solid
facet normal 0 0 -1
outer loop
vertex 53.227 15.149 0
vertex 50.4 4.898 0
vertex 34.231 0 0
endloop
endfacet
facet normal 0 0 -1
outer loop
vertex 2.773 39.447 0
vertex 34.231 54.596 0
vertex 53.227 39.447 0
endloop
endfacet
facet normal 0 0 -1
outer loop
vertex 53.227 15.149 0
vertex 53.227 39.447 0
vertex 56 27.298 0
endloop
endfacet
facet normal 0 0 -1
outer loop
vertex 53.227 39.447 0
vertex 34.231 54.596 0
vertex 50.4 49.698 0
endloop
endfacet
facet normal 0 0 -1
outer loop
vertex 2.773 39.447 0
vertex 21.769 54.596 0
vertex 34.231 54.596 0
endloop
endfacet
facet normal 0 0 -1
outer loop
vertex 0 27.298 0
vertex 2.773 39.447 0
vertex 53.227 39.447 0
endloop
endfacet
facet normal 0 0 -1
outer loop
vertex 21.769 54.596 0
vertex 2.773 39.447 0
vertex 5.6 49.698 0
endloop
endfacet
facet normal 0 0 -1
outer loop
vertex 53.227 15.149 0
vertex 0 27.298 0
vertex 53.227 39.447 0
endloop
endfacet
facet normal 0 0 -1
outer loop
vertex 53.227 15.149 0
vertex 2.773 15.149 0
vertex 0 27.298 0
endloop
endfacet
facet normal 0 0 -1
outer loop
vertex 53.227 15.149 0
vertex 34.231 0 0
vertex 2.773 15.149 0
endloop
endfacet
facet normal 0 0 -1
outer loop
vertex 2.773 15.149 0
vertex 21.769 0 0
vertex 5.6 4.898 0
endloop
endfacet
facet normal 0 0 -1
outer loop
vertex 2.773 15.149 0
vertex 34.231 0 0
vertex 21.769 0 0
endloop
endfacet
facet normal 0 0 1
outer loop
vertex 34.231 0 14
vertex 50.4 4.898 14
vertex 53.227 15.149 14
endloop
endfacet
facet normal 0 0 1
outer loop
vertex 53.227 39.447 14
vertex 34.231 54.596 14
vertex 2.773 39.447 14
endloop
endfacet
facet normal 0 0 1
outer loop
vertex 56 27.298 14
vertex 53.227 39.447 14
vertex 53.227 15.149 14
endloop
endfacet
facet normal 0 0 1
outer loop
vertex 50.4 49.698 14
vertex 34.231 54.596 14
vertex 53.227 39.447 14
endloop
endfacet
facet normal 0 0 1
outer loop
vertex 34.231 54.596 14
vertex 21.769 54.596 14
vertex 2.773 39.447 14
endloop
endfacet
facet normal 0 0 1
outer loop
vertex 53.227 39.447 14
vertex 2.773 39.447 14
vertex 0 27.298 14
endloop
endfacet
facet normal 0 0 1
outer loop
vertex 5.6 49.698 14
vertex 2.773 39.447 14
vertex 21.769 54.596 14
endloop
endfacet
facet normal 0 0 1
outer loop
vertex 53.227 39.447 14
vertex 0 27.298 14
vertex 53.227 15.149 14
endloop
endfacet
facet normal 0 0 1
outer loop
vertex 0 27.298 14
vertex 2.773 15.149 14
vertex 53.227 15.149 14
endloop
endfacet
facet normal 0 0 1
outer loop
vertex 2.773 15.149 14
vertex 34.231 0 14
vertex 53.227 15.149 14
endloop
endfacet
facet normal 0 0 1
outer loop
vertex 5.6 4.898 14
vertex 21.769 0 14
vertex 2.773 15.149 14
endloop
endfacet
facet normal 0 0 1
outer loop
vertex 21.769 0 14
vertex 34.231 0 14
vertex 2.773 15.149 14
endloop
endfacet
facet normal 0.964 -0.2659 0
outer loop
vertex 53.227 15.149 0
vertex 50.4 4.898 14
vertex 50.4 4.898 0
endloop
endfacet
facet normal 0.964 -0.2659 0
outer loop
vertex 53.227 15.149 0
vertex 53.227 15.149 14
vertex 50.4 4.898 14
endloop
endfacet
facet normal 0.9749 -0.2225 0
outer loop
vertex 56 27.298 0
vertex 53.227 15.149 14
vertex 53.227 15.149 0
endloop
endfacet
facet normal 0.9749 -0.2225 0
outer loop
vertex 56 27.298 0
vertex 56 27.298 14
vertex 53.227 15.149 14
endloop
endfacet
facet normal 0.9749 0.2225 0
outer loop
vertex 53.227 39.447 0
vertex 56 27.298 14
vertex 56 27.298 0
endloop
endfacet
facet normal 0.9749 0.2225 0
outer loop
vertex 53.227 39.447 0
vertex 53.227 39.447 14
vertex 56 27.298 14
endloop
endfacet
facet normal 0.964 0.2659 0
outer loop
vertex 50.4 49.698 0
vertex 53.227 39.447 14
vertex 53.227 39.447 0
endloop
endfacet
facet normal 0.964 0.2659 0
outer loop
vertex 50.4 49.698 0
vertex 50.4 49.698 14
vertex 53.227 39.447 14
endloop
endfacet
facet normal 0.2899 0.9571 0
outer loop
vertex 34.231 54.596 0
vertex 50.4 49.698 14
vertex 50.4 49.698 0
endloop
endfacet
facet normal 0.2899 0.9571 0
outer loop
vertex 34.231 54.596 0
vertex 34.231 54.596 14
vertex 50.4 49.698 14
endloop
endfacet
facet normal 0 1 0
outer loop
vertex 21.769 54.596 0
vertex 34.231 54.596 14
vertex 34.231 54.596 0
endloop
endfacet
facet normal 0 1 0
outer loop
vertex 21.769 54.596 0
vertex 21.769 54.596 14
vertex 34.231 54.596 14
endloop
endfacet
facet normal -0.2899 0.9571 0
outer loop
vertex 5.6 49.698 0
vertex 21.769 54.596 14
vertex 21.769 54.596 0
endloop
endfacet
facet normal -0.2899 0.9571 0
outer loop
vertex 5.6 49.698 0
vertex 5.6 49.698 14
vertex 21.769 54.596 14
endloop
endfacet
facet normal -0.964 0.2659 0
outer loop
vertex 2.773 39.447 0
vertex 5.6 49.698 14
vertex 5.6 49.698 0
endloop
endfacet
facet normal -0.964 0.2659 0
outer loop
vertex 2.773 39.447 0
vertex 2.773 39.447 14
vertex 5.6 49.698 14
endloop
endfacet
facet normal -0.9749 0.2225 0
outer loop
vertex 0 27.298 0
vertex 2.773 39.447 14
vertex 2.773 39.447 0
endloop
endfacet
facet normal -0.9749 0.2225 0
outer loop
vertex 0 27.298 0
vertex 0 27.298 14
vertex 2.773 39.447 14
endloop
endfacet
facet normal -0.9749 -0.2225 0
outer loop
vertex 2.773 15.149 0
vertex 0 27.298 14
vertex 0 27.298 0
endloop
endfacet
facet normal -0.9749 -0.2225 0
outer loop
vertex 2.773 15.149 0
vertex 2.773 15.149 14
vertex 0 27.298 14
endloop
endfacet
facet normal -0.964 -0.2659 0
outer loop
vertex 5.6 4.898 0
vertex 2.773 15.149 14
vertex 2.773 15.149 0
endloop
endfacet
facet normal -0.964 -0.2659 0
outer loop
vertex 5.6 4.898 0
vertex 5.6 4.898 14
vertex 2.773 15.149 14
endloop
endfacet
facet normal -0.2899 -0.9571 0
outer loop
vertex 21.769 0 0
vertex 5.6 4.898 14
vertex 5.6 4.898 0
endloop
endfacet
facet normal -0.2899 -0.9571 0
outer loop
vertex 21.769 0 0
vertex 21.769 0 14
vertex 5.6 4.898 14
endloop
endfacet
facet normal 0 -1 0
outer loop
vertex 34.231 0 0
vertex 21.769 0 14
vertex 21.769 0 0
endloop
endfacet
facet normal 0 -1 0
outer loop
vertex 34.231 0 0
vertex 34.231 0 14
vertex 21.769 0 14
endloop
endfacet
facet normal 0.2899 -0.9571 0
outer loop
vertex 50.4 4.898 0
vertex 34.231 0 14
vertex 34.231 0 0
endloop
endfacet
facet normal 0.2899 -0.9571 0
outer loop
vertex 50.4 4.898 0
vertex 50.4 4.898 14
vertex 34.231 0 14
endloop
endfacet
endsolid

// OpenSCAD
$fn = 32;

// ----------------------------------------------------------------------
// Flat adaptor: hex_disc, 14 mm thick
// ----------------------------------------------------------------------

// --- parameters (mm) ---
profile_height = 14;      // extrusion height
profile_points = 14;      // points of the closed outline

profile = [[0, 27.298], [2.773, 15.149], [5.6, 4.898], [21.769, 0], [34.231, 0], [50.4, 4.898], [53.227, 15.149], [56, 27.298], [53.227, 39.447], [50.4, 49.698], [34.231, 54.596], [21.769, 54.596], [5.6, 49.698], [2.773, 39.447]];  // single closed polygon, 14 points, counter clockwise

// --- the one profile operation ---
linear_extrude(height = profile_height) polygon(points = profile);
